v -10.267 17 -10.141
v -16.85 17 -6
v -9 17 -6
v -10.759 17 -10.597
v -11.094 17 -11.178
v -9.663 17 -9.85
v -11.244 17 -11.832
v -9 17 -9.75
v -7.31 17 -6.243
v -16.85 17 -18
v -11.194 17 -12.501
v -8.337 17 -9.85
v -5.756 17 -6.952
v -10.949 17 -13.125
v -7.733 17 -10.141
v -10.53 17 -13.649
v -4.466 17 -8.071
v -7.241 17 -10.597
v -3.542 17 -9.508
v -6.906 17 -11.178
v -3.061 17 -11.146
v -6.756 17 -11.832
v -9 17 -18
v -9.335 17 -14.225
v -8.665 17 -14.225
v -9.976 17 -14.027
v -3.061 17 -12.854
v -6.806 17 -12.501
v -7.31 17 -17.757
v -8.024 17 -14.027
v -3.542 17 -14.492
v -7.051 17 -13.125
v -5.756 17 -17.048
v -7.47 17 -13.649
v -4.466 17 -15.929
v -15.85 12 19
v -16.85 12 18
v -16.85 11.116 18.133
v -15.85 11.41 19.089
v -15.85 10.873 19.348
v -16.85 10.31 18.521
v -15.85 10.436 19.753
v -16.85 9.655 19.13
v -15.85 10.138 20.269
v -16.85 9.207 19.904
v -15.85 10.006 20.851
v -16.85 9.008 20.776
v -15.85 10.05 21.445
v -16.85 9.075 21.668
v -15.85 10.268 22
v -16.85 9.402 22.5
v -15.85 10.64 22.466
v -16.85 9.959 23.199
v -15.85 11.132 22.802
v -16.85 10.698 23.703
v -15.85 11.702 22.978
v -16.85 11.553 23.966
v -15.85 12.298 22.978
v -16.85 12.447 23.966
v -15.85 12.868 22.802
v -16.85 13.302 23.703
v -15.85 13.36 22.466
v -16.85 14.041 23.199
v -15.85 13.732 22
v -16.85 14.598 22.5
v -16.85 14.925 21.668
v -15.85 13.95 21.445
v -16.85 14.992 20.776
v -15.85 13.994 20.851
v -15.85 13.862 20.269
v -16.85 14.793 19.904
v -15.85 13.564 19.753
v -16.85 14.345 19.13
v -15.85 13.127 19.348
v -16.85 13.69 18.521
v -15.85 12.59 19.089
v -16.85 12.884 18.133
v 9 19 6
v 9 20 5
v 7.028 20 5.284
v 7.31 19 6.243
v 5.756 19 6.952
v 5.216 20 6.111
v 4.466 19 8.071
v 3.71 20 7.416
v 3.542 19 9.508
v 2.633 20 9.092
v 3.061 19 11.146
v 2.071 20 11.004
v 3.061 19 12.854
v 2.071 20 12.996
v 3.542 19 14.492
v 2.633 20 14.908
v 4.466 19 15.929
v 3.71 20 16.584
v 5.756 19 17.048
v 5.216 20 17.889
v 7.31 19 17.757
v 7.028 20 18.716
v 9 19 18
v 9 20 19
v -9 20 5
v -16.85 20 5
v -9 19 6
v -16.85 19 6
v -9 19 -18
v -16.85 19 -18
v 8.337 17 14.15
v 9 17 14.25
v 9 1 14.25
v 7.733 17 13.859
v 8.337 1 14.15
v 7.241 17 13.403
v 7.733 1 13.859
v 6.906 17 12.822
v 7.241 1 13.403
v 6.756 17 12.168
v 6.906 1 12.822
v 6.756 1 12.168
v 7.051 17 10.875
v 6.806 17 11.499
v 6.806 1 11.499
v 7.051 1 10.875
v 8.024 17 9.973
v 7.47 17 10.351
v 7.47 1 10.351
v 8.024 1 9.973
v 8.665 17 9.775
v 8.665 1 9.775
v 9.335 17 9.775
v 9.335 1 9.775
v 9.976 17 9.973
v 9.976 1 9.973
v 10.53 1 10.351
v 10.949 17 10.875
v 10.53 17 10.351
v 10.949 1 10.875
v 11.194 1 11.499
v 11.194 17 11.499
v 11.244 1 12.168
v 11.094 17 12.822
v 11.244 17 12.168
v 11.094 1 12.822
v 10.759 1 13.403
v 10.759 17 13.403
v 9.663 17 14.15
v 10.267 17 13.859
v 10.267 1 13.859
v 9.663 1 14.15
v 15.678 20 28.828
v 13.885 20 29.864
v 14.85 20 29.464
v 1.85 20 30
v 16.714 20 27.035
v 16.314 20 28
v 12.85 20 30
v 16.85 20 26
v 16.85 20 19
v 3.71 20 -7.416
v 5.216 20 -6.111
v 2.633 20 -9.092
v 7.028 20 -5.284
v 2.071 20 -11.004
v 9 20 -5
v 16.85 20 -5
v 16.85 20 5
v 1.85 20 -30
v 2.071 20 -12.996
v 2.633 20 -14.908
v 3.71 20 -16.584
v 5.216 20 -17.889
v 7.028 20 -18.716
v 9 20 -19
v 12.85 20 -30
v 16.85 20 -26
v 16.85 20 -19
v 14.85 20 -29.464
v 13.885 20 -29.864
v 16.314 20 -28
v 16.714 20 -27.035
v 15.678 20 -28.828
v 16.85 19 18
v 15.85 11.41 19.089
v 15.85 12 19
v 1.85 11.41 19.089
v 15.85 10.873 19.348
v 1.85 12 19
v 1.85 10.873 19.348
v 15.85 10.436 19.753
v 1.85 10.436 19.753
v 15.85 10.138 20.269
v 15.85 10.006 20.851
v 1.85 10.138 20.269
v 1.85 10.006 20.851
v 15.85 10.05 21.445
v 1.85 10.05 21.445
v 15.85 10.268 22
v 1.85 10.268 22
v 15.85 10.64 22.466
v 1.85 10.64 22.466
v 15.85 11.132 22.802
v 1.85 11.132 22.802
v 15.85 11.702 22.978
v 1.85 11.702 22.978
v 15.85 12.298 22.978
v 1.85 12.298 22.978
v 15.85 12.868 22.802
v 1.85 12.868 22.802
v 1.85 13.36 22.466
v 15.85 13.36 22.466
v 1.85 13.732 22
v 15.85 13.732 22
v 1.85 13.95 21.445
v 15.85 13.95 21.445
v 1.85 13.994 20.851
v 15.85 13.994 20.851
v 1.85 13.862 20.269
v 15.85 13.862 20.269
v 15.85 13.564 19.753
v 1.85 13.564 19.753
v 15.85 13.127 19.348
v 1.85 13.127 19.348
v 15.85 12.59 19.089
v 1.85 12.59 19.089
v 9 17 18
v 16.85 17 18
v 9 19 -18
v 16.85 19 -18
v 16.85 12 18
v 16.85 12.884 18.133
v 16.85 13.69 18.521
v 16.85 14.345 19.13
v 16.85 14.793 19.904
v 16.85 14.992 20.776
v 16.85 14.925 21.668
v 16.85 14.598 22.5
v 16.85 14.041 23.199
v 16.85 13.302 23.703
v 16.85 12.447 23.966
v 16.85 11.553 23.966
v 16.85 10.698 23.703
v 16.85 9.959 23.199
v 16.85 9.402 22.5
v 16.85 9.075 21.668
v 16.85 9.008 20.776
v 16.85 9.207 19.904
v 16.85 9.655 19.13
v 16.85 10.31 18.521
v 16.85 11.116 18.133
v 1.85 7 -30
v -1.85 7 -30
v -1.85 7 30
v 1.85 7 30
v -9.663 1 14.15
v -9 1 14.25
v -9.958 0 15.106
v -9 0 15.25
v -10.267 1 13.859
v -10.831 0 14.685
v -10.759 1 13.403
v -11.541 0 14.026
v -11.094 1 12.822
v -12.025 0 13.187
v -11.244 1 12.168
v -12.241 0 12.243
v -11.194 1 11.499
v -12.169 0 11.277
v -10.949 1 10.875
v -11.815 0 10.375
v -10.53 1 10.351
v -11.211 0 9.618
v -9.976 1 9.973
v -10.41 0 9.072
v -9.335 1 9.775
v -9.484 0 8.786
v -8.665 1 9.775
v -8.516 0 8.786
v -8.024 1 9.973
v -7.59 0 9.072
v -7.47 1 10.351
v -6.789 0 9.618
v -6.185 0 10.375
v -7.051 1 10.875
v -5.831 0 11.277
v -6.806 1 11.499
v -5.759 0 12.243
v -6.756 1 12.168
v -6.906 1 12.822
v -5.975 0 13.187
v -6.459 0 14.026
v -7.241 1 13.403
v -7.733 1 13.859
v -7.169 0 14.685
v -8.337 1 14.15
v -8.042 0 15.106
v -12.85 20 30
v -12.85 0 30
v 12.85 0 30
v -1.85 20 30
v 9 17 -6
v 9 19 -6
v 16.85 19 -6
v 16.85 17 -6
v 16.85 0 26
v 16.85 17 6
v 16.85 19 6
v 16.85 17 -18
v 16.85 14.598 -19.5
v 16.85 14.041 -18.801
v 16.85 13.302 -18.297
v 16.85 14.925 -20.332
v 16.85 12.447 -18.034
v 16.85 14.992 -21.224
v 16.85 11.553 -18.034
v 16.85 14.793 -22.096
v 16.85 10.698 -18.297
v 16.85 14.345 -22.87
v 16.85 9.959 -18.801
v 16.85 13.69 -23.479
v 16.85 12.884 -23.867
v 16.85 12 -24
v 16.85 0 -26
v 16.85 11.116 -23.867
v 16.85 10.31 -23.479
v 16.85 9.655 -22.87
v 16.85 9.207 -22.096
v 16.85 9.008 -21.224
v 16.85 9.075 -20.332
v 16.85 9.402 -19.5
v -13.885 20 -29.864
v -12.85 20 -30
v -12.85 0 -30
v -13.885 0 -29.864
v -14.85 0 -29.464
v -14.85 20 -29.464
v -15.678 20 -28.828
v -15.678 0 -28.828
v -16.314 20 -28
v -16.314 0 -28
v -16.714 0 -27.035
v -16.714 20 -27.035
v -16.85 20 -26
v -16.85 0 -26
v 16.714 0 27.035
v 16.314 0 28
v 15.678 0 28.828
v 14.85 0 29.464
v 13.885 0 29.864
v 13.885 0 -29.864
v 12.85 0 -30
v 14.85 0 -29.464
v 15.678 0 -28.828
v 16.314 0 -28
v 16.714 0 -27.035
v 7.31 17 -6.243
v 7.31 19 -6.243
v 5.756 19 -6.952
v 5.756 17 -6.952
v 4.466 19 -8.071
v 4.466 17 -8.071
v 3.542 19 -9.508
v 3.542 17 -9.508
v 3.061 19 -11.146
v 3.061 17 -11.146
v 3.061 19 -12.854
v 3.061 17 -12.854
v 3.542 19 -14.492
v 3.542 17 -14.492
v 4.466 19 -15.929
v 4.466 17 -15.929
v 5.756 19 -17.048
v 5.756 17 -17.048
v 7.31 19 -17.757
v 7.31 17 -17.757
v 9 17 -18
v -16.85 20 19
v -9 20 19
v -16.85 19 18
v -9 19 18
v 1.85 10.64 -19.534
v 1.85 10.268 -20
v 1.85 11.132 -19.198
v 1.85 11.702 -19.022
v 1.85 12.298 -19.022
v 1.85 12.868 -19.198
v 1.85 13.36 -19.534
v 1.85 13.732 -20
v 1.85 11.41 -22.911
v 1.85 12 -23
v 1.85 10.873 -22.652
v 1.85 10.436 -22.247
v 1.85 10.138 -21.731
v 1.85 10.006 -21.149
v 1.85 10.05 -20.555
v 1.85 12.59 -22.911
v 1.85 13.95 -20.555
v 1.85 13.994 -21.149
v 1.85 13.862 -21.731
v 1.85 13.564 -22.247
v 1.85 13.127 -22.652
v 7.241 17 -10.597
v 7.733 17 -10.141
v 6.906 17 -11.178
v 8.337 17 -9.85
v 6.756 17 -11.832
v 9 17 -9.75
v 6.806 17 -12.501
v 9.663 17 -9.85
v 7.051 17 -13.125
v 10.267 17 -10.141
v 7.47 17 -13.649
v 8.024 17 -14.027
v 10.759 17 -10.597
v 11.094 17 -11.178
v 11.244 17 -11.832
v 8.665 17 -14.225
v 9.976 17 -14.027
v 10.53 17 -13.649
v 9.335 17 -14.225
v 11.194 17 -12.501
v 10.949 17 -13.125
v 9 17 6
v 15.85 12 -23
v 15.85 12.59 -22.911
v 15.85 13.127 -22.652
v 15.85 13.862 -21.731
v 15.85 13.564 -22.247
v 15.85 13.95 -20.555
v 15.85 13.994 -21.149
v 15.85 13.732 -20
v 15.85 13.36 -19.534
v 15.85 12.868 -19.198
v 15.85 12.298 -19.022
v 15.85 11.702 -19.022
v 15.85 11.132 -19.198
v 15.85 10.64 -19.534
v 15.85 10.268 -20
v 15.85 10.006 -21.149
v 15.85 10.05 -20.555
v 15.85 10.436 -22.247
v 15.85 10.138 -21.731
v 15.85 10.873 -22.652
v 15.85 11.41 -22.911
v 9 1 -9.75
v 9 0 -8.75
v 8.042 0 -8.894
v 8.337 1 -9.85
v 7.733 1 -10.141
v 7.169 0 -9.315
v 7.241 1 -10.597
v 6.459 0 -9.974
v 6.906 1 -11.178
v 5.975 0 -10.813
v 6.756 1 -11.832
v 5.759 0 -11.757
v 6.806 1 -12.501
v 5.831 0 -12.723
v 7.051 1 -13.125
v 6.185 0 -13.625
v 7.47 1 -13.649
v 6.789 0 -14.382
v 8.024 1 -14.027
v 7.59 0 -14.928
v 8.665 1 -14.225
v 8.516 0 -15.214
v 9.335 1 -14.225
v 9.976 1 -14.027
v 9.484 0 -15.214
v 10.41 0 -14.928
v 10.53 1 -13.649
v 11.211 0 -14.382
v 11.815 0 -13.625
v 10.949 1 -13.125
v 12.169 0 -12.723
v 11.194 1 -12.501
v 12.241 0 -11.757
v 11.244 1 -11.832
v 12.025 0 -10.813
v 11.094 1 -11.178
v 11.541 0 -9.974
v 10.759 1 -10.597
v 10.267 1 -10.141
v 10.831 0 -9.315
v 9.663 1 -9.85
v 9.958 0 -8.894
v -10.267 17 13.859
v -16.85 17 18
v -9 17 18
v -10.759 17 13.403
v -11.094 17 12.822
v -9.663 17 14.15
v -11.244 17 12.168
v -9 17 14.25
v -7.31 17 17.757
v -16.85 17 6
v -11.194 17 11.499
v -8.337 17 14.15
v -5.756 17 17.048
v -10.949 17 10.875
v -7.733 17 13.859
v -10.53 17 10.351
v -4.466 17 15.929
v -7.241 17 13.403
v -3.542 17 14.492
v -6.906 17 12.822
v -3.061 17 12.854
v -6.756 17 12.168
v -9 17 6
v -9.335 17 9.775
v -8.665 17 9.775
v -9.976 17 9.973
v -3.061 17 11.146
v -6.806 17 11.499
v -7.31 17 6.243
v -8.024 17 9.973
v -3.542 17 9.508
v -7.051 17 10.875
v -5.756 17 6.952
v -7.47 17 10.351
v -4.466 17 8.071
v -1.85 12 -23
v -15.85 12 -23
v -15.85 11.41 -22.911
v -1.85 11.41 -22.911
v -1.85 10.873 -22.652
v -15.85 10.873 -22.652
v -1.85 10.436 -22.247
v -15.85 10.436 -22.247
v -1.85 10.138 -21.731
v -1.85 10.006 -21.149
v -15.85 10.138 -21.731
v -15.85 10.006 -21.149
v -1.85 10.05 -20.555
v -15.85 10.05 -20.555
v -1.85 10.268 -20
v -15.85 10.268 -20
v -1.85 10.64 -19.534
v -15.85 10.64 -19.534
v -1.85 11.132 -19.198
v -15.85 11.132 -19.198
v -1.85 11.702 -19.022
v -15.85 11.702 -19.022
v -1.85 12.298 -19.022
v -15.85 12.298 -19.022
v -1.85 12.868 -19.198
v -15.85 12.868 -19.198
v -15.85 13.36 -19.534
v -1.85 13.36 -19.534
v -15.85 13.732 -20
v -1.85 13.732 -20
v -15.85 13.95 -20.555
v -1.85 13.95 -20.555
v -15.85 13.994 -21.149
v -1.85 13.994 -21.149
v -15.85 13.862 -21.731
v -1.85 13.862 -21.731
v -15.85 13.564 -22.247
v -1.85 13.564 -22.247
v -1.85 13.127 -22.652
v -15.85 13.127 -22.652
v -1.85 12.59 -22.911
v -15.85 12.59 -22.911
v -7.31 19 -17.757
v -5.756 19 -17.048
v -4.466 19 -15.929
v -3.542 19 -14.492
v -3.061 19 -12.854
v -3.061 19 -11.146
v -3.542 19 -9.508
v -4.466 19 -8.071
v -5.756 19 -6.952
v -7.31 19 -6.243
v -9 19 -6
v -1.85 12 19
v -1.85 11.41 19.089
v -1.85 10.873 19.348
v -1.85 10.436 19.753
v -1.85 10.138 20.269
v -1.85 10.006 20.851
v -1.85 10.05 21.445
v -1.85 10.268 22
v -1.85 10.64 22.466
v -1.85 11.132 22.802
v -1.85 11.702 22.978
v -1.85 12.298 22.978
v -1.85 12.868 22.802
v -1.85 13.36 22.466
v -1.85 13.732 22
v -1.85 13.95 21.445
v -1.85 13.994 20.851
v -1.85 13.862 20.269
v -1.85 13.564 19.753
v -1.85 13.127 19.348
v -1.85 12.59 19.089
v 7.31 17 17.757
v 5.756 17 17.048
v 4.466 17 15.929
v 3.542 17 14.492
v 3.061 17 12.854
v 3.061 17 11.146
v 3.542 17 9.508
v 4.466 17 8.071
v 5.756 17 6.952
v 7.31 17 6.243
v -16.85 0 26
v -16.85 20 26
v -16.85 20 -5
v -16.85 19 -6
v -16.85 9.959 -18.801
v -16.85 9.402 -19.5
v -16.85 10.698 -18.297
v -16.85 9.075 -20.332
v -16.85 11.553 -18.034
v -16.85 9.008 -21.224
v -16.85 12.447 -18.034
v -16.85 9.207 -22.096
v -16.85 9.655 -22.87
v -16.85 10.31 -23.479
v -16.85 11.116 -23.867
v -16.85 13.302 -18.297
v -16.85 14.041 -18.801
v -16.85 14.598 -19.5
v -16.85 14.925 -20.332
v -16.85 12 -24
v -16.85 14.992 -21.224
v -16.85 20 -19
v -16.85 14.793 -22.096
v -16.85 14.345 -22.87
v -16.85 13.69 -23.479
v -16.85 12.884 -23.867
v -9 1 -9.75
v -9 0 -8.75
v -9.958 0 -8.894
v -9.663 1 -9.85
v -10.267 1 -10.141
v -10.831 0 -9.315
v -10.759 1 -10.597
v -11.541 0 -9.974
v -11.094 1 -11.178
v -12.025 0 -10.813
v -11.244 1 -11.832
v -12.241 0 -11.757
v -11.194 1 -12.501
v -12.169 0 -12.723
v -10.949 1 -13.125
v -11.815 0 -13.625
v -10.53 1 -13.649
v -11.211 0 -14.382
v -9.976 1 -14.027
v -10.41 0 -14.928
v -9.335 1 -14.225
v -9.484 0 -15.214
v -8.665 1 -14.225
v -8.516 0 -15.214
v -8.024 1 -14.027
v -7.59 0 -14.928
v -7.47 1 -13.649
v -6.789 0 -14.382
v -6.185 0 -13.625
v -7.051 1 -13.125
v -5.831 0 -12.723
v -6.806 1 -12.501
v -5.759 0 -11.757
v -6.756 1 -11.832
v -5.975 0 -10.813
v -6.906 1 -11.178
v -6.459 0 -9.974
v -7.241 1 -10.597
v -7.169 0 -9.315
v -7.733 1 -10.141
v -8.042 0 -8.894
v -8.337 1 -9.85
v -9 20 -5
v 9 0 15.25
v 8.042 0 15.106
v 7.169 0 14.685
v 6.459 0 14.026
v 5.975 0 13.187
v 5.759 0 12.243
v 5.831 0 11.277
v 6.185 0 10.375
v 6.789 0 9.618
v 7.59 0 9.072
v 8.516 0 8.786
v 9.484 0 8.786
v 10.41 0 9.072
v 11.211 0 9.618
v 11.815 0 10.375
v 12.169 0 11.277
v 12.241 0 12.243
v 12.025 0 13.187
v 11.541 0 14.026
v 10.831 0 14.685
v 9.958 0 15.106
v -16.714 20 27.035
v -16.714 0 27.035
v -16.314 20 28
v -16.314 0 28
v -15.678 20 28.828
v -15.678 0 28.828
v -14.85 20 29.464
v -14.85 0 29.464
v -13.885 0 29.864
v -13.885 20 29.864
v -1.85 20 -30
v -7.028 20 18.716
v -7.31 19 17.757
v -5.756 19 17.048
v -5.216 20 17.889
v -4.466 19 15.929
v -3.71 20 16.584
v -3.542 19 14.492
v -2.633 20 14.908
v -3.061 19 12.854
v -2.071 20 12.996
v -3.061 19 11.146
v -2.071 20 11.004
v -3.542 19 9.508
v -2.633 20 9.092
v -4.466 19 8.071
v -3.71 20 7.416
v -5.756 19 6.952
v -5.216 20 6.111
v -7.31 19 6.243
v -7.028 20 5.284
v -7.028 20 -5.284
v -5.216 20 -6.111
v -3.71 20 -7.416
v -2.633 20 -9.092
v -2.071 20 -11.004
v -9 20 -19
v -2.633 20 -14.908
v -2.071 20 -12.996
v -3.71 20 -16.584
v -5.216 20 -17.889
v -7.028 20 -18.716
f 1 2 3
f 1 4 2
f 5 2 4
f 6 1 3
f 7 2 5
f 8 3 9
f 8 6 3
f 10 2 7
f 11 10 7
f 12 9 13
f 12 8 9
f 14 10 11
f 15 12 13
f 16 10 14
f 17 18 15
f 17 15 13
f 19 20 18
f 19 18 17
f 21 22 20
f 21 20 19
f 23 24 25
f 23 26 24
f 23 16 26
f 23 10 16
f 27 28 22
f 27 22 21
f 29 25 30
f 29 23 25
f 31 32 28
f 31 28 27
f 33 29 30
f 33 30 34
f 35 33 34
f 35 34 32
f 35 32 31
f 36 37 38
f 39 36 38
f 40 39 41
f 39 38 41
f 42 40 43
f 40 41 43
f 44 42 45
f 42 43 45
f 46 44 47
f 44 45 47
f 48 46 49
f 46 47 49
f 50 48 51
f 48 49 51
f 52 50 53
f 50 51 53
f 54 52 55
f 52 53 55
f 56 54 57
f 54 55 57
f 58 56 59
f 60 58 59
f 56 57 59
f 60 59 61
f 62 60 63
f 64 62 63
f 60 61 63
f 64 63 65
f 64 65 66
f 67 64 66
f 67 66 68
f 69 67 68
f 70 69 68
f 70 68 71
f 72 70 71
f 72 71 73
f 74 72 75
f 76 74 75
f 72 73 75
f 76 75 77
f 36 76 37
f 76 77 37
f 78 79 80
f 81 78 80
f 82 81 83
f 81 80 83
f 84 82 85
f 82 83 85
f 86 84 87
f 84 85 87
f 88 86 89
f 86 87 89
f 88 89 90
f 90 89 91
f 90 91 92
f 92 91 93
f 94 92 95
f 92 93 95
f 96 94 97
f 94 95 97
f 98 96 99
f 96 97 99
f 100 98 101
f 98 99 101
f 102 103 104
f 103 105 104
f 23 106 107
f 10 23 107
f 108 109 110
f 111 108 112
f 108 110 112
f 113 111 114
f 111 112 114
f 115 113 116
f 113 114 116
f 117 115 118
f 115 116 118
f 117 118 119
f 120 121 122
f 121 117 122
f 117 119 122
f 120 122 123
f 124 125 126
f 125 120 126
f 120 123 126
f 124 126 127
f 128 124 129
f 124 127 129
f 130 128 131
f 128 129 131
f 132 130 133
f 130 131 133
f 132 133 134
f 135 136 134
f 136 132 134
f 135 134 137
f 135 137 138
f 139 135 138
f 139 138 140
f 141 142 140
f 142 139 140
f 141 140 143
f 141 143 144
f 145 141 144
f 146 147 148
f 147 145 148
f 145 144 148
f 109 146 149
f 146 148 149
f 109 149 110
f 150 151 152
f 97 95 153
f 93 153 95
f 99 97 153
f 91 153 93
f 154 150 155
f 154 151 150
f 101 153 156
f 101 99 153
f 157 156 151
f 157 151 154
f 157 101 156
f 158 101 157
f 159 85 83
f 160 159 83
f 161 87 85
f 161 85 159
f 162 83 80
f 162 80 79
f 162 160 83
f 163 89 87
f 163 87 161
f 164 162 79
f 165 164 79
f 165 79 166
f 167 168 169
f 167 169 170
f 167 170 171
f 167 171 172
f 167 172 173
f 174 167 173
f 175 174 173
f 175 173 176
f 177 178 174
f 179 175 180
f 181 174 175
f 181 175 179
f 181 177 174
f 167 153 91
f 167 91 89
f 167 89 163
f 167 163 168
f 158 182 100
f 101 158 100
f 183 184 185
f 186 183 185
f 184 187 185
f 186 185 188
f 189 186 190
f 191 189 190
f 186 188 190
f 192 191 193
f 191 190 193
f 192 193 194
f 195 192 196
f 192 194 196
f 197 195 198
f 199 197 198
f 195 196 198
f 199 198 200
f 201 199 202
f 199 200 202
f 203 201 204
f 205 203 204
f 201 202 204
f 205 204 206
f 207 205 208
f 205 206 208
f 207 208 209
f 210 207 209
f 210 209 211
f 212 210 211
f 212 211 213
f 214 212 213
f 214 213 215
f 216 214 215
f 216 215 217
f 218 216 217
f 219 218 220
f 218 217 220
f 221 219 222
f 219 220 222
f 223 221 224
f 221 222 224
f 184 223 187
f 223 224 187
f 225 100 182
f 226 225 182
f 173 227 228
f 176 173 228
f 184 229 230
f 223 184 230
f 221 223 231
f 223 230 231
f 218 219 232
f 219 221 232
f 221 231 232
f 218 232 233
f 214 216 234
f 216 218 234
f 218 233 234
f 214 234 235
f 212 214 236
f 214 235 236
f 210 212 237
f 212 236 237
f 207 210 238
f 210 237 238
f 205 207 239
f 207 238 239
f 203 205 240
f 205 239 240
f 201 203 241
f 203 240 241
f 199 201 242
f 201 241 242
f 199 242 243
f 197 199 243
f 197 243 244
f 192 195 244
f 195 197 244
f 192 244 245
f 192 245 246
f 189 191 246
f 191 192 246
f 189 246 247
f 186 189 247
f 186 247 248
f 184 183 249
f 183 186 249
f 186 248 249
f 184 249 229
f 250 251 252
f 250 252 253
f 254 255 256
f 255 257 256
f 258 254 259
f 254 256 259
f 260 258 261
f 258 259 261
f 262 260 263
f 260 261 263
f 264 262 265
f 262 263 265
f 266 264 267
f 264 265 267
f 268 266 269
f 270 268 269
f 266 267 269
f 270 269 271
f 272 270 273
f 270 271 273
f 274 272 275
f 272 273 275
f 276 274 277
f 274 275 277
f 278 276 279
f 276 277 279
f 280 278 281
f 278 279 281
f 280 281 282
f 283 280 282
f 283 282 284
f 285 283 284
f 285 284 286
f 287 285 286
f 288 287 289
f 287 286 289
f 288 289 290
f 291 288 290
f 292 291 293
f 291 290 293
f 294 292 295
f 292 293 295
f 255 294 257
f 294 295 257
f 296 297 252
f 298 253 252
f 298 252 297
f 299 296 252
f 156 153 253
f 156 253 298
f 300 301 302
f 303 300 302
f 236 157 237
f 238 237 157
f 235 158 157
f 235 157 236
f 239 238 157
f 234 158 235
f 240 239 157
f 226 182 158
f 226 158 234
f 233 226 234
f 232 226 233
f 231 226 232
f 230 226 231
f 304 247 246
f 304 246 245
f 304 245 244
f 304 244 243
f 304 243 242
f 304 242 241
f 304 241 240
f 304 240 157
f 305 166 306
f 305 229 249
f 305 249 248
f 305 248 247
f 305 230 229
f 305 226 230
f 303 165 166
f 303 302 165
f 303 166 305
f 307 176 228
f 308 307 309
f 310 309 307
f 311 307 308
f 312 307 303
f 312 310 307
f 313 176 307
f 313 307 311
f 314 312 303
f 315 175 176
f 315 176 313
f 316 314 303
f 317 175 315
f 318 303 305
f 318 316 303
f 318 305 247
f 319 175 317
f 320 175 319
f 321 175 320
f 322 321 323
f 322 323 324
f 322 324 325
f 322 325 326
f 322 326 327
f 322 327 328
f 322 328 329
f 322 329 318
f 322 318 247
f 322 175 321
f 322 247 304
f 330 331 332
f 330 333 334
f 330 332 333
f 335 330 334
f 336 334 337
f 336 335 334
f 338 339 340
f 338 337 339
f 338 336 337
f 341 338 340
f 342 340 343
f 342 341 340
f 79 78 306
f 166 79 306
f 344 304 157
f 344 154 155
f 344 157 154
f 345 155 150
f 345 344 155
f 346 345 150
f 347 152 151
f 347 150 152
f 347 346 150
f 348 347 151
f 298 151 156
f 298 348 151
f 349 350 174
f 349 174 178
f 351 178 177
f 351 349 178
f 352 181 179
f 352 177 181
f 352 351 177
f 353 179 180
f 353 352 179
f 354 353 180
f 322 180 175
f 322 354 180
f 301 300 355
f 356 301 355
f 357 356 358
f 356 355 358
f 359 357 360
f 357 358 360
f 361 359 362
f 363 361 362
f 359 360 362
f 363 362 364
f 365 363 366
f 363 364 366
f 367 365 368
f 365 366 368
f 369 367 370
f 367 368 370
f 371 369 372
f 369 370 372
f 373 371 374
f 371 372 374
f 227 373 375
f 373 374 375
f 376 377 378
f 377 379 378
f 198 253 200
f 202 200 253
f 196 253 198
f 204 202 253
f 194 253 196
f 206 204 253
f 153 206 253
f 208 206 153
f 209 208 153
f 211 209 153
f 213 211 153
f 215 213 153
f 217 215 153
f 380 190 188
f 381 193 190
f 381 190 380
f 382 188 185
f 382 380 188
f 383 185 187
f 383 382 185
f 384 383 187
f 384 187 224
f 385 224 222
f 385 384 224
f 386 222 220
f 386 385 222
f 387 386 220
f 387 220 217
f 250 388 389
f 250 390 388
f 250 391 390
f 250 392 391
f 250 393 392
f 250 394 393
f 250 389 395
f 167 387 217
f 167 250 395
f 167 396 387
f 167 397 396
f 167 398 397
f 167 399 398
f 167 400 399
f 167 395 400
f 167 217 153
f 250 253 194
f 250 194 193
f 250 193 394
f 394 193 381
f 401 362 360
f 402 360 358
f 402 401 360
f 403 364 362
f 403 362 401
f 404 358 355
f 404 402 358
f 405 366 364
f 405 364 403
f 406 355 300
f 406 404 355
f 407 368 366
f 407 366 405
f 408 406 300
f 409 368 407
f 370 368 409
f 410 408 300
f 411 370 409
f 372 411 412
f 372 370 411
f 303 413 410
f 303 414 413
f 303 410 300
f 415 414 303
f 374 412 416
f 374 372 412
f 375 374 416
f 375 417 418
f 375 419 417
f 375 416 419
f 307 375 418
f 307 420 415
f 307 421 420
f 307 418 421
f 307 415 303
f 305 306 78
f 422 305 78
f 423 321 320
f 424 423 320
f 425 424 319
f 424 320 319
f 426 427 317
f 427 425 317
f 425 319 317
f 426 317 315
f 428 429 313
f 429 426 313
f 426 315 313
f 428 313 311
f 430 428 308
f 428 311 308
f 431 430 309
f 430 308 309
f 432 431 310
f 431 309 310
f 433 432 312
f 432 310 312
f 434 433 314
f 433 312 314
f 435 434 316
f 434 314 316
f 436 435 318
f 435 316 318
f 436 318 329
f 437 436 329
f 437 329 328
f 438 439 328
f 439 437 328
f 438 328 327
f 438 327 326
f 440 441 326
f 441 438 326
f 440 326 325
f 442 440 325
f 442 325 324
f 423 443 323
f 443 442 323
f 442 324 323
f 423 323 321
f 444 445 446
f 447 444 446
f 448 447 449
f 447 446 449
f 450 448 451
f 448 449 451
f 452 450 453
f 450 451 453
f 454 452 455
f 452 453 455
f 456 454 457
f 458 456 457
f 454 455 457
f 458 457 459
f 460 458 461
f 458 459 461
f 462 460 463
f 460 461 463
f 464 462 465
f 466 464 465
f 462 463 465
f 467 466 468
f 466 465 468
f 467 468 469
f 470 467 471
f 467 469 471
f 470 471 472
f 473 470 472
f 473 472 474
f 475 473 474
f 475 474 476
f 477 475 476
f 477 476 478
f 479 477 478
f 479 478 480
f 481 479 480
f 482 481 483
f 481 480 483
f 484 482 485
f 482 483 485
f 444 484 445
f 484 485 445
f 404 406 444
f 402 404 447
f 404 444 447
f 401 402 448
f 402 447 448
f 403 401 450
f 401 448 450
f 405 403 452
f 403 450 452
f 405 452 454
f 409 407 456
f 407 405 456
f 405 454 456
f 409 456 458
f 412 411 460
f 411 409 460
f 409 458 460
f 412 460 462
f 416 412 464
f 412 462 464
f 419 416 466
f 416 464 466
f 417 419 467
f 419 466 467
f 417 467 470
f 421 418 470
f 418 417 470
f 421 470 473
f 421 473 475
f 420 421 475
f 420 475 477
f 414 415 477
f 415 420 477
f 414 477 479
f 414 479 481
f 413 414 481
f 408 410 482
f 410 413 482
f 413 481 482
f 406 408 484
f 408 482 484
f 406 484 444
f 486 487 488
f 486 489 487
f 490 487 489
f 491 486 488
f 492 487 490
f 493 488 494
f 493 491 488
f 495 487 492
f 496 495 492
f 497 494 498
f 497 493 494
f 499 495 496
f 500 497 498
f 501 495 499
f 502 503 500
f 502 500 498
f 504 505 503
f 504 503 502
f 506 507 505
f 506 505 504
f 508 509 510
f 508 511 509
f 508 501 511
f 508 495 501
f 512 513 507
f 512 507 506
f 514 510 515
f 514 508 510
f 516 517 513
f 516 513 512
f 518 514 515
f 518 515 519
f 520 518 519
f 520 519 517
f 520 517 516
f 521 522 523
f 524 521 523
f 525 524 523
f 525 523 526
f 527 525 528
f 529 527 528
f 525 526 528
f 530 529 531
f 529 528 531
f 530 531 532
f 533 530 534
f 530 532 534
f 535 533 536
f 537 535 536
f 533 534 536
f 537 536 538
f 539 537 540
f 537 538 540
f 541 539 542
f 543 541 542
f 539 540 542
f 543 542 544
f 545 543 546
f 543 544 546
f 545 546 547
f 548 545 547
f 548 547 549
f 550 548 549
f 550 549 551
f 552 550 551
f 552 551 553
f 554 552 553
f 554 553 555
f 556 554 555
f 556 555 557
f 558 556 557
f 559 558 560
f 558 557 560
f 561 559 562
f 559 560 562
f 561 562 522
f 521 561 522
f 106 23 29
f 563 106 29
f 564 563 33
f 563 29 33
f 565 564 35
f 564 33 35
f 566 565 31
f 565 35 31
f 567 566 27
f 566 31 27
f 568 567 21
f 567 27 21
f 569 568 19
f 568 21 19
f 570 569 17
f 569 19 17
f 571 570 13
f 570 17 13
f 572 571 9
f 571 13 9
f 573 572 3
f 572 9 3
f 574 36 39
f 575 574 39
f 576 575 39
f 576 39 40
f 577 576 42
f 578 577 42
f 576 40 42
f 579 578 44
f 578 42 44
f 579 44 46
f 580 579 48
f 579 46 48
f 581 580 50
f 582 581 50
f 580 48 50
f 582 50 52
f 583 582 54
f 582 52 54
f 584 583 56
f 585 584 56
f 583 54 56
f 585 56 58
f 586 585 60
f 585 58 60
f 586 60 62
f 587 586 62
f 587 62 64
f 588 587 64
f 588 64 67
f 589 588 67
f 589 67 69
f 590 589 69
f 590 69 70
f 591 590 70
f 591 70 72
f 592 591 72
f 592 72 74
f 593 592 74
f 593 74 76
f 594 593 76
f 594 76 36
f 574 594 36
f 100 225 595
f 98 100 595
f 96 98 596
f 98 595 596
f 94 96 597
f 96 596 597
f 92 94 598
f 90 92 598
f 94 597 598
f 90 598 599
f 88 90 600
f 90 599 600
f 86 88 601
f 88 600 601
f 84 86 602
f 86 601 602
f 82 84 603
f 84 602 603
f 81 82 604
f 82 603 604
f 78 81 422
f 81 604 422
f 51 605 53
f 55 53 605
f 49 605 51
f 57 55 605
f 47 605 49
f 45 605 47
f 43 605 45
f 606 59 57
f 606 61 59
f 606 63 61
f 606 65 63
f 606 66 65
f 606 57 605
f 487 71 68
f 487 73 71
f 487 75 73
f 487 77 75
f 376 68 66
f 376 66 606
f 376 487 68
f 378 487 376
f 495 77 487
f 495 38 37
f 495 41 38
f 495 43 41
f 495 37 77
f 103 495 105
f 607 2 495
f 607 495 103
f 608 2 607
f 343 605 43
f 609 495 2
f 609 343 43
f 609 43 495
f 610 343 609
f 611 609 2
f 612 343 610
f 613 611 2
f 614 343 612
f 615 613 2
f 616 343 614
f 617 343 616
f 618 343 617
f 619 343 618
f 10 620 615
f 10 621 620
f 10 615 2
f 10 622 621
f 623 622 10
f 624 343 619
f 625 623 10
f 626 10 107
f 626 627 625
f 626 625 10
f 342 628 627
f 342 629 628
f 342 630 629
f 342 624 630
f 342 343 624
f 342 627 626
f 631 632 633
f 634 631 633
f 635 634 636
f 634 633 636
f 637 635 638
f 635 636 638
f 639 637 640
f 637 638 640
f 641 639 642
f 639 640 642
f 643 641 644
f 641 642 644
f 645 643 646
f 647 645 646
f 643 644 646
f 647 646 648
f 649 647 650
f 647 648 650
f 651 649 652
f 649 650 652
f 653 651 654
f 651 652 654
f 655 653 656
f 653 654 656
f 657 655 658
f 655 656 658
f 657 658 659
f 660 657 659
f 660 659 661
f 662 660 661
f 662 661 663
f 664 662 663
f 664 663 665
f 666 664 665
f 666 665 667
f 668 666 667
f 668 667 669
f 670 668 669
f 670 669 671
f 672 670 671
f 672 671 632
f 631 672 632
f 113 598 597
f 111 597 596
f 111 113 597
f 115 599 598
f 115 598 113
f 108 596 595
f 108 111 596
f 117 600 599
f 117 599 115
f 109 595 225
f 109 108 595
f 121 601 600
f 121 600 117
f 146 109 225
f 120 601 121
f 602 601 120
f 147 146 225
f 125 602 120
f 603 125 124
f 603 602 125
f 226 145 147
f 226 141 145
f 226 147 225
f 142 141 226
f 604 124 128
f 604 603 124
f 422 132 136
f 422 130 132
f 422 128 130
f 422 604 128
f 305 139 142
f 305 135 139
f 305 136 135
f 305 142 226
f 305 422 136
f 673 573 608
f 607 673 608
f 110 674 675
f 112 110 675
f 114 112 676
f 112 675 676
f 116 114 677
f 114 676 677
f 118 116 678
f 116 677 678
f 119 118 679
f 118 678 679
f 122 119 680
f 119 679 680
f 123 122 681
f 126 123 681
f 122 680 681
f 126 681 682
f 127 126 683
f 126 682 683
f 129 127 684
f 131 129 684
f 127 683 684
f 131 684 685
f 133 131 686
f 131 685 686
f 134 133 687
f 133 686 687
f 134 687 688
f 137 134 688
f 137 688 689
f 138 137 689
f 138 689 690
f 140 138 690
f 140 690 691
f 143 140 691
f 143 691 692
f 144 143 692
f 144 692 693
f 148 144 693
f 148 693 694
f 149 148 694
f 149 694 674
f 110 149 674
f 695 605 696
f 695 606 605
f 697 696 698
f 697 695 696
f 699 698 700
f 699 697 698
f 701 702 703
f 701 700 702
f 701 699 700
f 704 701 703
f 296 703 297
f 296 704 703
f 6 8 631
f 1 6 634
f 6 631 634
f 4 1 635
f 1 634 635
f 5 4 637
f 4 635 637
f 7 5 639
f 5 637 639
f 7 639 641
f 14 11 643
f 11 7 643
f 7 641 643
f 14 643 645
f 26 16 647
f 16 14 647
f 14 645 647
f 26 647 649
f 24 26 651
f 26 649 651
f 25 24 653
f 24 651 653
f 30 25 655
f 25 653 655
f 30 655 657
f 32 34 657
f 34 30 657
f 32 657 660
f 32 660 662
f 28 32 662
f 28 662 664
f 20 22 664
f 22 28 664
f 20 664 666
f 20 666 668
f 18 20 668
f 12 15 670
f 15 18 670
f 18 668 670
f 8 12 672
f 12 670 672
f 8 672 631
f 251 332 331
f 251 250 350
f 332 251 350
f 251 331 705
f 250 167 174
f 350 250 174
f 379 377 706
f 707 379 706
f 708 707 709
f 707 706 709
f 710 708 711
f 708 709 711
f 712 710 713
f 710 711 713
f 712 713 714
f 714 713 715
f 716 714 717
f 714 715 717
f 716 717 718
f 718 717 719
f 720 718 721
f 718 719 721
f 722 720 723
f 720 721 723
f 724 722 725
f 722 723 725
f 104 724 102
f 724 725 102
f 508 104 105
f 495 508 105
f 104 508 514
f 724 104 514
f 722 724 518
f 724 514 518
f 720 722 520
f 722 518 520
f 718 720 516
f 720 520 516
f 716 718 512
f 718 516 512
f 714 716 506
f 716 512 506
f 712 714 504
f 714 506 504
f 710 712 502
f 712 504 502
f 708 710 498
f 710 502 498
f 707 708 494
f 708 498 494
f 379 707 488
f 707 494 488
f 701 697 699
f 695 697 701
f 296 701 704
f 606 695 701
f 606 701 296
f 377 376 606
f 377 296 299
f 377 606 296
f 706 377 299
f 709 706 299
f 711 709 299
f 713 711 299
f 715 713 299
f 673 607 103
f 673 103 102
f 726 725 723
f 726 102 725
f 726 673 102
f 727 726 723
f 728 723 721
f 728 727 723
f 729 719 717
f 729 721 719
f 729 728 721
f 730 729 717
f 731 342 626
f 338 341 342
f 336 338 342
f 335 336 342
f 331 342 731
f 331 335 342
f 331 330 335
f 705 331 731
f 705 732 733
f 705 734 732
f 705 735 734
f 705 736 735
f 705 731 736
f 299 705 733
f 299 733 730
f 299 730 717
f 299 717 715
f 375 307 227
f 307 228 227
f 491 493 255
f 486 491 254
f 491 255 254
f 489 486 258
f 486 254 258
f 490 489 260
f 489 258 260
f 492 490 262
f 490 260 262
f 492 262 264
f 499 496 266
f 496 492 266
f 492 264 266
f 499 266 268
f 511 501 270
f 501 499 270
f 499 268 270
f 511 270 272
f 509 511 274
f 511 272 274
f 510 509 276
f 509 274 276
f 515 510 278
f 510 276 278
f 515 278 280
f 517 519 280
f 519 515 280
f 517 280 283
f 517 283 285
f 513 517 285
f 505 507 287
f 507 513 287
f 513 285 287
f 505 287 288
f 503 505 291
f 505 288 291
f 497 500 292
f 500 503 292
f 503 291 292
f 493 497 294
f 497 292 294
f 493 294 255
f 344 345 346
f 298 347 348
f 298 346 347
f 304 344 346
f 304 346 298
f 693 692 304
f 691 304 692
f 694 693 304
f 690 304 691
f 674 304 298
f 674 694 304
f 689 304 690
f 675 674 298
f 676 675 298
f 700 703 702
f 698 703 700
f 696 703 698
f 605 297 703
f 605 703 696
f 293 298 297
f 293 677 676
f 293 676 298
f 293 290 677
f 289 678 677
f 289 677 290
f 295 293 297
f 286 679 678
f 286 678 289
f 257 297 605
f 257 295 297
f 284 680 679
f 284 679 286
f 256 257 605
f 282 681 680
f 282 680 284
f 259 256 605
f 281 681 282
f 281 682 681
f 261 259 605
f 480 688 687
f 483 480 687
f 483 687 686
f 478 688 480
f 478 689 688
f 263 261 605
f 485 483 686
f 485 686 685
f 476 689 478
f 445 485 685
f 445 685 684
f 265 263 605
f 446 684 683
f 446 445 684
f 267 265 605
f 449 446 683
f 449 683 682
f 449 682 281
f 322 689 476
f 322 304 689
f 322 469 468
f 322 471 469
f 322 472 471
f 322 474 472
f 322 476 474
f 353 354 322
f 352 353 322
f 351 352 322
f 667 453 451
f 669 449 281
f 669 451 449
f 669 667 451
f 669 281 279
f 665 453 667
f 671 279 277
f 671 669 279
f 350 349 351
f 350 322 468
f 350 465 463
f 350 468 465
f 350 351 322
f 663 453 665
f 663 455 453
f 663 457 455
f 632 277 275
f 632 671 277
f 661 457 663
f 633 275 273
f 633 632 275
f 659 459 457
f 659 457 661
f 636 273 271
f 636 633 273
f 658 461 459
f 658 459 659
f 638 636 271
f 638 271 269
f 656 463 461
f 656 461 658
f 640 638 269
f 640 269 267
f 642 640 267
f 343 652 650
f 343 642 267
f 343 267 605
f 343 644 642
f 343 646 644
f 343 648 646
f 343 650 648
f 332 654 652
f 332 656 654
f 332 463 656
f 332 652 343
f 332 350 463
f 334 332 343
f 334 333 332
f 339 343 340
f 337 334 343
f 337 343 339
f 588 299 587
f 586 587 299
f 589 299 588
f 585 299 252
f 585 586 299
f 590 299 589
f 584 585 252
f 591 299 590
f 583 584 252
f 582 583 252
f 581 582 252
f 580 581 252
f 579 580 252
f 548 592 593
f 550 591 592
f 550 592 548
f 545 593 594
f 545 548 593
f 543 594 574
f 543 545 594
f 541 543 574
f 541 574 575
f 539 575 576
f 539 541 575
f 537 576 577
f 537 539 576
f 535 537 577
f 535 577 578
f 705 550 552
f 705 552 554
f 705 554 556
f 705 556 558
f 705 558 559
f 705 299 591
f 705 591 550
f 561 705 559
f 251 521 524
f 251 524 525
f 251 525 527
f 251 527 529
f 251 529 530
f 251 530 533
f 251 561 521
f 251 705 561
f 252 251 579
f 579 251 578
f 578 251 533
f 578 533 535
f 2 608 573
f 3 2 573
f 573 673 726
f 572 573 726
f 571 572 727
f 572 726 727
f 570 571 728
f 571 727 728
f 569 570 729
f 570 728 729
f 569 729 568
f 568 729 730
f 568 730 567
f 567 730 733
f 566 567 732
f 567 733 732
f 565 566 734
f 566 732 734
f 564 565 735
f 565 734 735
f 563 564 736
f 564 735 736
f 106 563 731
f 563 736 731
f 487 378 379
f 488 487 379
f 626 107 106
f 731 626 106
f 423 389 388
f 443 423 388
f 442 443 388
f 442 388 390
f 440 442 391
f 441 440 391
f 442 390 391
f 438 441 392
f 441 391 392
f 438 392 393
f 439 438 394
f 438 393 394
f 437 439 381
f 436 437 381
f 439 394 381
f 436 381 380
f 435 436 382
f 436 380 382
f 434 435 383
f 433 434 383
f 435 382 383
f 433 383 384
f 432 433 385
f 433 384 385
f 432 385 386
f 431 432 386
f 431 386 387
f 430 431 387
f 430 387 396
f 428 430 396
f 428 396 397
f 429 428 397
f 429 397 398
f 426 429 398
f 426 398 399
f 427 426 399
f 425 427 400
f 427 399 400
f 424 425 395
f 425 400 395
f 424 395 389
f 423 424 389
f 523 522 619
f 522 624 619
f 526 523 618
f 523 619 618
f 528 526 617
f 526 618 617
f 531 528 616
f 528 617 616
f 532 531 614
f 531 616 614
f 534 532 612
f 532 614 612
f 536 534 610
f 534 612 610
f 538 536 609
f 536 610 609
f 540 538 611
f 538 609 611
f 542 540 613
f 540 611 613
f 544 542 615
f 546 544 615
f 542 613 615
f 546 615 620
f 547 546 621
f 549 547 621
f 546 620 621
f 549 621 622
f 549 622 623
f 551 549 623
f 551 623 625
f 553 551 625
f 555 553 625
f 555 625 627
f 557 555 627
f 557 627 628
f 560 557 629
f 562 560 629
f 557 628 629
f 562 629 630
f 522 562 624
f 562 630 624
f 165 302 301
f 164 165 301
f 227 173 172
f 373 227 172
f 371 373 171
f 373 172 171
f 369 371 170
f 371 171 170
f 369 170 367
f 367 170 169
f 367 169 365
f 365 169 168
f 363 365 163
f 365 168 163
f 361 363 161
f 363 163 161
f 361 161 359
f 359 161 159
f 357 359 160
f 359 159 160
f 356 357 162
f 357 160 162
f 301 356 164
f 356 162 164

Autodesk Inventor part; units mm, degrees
ref_plane "YZ Plane" through (0, 0, 0) normal (1, 0, 0) x (0, 1, 0)
ref_plane "XZ Plane" through (0, 0, 0) normal (0, 1, 0) x (-1, 0, 0)
ref_plane "XY Plane" through (0, 0, 0) normal (0, 0, 1) x (1, 0, 0)
sketch "Sketch1" plane through (0, 0, 0) normal (0, 0, 1) x (1, 0, 0)
  line L0 (16.85, 0) -> (-16.85, 0)
  line L1 (-16.85, 0) -> (-16.85, 20)
  line L2 (-16.85, 20) -> (-1.85, 20)
  line L3 (-1.85, 20) -> (-1.85, 7)
  line L4 (-1.85, 7) -> (1.85, 7)
  line L5 (1.85, 7) -> (1.85, 20)
  line L6 (1.85, 20) -> (16.85, 20)
  line L7 (16.85, 20) -> (16.85, 0)
  line L8 (-23.59, 0) -> (23.59, 0) projected
  line L9 (0, -4) -> (0, 24) projected
  point P0 (0, 0)
  point P1 (0, 7)
  point P2 (0, 0)
  dimension "d0" = 33.7
  dimension "d1" = 3.7
  dimension "d2" = 13
  dimension "d3" = 20
extrude "Extrusion1" add sketch "Sketch1" along normal mid plane 60
sketch "Sketch2" plane through (-16.85, 20, 30) normal (0, 1, 0) x (1, 0, 0)
  line L0 (0, 60) -> (0, 0) projected
  line L1 (15, 0) -> (0, 0) projected
  line L2 (15, 60) -> (15, 0) projected
  line L3 (0, 60) -> (15, 60) projected
  line L4 (18.7, 60) -> (18.7, 0) projected
  line L5 (33.7, 0) -> (18.7, 0) projected
  line L6 (33.7, 60) -> (33.7, 0) projected
  line L7 (18.7, 60) -> (33.7, 60) projected
  line L8 (25.85, 42) -> (7.85, 42) construction
  line L9 (7.85, 42) -> (7.85, 18) construction
  line L10 (7.85, 18) -> (25.85, 18) construction
  line L11 (25.85, 18) -> (25.85, 42) construction
  line L12 (25.85, 42) -> (7.85, 18) construction
  line L13 (7.85, 42) -> (25.85, 18) construction
  point P0 (16.85, 30)
  dimension "d6" = 18
  dimension "d7" = 24
hole "Hole1" at (-9, 20, 12) at (-9, 20, -12) at (9, 20, 12) at (9, 20, -12) direction (0, -1, 0) diameter 4.5 end through all counterbore diameter 12 counterbore depth 3
sketch "Sketch3" plane through (1.85, 20, 30) normal (0, 1, 0) x (1, 0, 0)
  circle A0 centre (-10.85, 18) radius 6 projected
  circle A1 centre (-10.85, 42) radius 6 projected
  line L0 (-18.7, 60) -> (-18.7, 0) projected
  line L1 (-3.7, 0) -> (-18.7, 0) projected
  line L2 (-3.7, 60) -> (-3.7, 0) projected
  line L3 (-18.7, 60) -> (-3.7, 60) projected
  circle A2 centre (7.15, 18) radius 6 projected
  circle A3 centre (7.15, 42) radius 6 projected
  line L4 (0, 60) -> (0, 0) projected
  line L5 (15, 0) -> (0, 0) projected
  line L6 (15, 60) -> (15, 0) projected
  line L7 (0, 60) -> (15, 60) projected
  line L8 (7.15, 12) -> (15, 12)
  line L9 (15, 12) -> (15, 24)
  line L10 (15, 24) -> (7.15, 24)
  line L11 (7.15, 24) -> (7.15, 12)
  line L12 (7.15, 36) -> (15, 36)
  line L13 (15, 36) -> (15, 48)
  line L14 (15, 48) -> (7.15, 48)
  line L15 (7.15, 48) -> (7.15, 36)
  line L16 (-18.7, 36) -> (-10.85, 36)
  line L17 (-10.85, 36) -> (-10.85, 48)
  line L18 (-10.85, 48) -> (-18.7, 48)
  line L19 (-18.7, 48) -> (-18.7, 36)
  line L20 (-18.7, 12) -> (-10.85, 12)
  line L21 (-10.85, 12) -> (-10.85, 24)
  line L22 (-10.85, 24) -> (-18.7, 24)
  line L23 (-18.7, 24) -> (-18.7, 12)
  circle A4 centre (7.15, 18) radius 6 projected
  circle A5 centre (7.15, 42) radius 6 projected
  point P0 (-1.85, 30)
extrude "Extrusion2" cut sketch "Sketch3" against normal blind 3 contours L21 A0 | A0 L20 L0 L22 | L0 L18 A1 L16 | A1 L17 | A2 L11 | A2 L10 L6 L8 | L12 A3 L14 L6 | L15 A3 picked at (-12.72, 18.7092) picked at (-12.72, 42.7092) picked at (8.397, 19.5637) picked at (8.7137, 43.247)
fillet "Fillet1" radius 4 4 edges at (-16.85, 10, 30) (16.85, 10, 30) (16.85, 10, -30) (-16.85, 10, -30)
chamfer "Chamfer1" distance 1 angle 45 12 edges at (3, 20, -12) (12.925, 20, -18) (12.925, 20, -6) (-12.925, 20, -18) (-3, 20, -12) (-12.925, 20, -6) (-12.925, 20, 6) (-3, 20, 12) (-12.925, 20, 18) (3, 20, 12) (12.925, 20, 6) (12.925, 20, 18)
chamfer "Chamfer2" distance 1 angle 45 4 edges at (-9, 0, 9.75) (9, 0, 9.75) (-9, 0, -14.25) (9, 0, -14.25)
sketch "Sketch4" plane through (16.85, 17, 18) normal (1, 0, 0) x (0, 0, -1)
  line L0 (-3, -5) -> (39, -5) construction
  line L1 (18, -21) -> (18, 7) projected
  line L2 (-1, 3) -> (-8, 3) projected
  point P0 (18, -17)
  point P1 (18, -5)
  dimension "d24" = 42
  dimension "d25" = 8
hole "Hole2" at (16.85, 12, 21) at (16.85, 12, -21) direction (-1, 0, 0) diameter 4 end through all
chamfer "Chamfer3" distance 1 angle 45 4 edges at (16.85, 12, 23) (16.85, 12, -19) (-16.85, 12, -19) (-16.85, 12, 23)
properties part number "sujetador plancha aluminio"
